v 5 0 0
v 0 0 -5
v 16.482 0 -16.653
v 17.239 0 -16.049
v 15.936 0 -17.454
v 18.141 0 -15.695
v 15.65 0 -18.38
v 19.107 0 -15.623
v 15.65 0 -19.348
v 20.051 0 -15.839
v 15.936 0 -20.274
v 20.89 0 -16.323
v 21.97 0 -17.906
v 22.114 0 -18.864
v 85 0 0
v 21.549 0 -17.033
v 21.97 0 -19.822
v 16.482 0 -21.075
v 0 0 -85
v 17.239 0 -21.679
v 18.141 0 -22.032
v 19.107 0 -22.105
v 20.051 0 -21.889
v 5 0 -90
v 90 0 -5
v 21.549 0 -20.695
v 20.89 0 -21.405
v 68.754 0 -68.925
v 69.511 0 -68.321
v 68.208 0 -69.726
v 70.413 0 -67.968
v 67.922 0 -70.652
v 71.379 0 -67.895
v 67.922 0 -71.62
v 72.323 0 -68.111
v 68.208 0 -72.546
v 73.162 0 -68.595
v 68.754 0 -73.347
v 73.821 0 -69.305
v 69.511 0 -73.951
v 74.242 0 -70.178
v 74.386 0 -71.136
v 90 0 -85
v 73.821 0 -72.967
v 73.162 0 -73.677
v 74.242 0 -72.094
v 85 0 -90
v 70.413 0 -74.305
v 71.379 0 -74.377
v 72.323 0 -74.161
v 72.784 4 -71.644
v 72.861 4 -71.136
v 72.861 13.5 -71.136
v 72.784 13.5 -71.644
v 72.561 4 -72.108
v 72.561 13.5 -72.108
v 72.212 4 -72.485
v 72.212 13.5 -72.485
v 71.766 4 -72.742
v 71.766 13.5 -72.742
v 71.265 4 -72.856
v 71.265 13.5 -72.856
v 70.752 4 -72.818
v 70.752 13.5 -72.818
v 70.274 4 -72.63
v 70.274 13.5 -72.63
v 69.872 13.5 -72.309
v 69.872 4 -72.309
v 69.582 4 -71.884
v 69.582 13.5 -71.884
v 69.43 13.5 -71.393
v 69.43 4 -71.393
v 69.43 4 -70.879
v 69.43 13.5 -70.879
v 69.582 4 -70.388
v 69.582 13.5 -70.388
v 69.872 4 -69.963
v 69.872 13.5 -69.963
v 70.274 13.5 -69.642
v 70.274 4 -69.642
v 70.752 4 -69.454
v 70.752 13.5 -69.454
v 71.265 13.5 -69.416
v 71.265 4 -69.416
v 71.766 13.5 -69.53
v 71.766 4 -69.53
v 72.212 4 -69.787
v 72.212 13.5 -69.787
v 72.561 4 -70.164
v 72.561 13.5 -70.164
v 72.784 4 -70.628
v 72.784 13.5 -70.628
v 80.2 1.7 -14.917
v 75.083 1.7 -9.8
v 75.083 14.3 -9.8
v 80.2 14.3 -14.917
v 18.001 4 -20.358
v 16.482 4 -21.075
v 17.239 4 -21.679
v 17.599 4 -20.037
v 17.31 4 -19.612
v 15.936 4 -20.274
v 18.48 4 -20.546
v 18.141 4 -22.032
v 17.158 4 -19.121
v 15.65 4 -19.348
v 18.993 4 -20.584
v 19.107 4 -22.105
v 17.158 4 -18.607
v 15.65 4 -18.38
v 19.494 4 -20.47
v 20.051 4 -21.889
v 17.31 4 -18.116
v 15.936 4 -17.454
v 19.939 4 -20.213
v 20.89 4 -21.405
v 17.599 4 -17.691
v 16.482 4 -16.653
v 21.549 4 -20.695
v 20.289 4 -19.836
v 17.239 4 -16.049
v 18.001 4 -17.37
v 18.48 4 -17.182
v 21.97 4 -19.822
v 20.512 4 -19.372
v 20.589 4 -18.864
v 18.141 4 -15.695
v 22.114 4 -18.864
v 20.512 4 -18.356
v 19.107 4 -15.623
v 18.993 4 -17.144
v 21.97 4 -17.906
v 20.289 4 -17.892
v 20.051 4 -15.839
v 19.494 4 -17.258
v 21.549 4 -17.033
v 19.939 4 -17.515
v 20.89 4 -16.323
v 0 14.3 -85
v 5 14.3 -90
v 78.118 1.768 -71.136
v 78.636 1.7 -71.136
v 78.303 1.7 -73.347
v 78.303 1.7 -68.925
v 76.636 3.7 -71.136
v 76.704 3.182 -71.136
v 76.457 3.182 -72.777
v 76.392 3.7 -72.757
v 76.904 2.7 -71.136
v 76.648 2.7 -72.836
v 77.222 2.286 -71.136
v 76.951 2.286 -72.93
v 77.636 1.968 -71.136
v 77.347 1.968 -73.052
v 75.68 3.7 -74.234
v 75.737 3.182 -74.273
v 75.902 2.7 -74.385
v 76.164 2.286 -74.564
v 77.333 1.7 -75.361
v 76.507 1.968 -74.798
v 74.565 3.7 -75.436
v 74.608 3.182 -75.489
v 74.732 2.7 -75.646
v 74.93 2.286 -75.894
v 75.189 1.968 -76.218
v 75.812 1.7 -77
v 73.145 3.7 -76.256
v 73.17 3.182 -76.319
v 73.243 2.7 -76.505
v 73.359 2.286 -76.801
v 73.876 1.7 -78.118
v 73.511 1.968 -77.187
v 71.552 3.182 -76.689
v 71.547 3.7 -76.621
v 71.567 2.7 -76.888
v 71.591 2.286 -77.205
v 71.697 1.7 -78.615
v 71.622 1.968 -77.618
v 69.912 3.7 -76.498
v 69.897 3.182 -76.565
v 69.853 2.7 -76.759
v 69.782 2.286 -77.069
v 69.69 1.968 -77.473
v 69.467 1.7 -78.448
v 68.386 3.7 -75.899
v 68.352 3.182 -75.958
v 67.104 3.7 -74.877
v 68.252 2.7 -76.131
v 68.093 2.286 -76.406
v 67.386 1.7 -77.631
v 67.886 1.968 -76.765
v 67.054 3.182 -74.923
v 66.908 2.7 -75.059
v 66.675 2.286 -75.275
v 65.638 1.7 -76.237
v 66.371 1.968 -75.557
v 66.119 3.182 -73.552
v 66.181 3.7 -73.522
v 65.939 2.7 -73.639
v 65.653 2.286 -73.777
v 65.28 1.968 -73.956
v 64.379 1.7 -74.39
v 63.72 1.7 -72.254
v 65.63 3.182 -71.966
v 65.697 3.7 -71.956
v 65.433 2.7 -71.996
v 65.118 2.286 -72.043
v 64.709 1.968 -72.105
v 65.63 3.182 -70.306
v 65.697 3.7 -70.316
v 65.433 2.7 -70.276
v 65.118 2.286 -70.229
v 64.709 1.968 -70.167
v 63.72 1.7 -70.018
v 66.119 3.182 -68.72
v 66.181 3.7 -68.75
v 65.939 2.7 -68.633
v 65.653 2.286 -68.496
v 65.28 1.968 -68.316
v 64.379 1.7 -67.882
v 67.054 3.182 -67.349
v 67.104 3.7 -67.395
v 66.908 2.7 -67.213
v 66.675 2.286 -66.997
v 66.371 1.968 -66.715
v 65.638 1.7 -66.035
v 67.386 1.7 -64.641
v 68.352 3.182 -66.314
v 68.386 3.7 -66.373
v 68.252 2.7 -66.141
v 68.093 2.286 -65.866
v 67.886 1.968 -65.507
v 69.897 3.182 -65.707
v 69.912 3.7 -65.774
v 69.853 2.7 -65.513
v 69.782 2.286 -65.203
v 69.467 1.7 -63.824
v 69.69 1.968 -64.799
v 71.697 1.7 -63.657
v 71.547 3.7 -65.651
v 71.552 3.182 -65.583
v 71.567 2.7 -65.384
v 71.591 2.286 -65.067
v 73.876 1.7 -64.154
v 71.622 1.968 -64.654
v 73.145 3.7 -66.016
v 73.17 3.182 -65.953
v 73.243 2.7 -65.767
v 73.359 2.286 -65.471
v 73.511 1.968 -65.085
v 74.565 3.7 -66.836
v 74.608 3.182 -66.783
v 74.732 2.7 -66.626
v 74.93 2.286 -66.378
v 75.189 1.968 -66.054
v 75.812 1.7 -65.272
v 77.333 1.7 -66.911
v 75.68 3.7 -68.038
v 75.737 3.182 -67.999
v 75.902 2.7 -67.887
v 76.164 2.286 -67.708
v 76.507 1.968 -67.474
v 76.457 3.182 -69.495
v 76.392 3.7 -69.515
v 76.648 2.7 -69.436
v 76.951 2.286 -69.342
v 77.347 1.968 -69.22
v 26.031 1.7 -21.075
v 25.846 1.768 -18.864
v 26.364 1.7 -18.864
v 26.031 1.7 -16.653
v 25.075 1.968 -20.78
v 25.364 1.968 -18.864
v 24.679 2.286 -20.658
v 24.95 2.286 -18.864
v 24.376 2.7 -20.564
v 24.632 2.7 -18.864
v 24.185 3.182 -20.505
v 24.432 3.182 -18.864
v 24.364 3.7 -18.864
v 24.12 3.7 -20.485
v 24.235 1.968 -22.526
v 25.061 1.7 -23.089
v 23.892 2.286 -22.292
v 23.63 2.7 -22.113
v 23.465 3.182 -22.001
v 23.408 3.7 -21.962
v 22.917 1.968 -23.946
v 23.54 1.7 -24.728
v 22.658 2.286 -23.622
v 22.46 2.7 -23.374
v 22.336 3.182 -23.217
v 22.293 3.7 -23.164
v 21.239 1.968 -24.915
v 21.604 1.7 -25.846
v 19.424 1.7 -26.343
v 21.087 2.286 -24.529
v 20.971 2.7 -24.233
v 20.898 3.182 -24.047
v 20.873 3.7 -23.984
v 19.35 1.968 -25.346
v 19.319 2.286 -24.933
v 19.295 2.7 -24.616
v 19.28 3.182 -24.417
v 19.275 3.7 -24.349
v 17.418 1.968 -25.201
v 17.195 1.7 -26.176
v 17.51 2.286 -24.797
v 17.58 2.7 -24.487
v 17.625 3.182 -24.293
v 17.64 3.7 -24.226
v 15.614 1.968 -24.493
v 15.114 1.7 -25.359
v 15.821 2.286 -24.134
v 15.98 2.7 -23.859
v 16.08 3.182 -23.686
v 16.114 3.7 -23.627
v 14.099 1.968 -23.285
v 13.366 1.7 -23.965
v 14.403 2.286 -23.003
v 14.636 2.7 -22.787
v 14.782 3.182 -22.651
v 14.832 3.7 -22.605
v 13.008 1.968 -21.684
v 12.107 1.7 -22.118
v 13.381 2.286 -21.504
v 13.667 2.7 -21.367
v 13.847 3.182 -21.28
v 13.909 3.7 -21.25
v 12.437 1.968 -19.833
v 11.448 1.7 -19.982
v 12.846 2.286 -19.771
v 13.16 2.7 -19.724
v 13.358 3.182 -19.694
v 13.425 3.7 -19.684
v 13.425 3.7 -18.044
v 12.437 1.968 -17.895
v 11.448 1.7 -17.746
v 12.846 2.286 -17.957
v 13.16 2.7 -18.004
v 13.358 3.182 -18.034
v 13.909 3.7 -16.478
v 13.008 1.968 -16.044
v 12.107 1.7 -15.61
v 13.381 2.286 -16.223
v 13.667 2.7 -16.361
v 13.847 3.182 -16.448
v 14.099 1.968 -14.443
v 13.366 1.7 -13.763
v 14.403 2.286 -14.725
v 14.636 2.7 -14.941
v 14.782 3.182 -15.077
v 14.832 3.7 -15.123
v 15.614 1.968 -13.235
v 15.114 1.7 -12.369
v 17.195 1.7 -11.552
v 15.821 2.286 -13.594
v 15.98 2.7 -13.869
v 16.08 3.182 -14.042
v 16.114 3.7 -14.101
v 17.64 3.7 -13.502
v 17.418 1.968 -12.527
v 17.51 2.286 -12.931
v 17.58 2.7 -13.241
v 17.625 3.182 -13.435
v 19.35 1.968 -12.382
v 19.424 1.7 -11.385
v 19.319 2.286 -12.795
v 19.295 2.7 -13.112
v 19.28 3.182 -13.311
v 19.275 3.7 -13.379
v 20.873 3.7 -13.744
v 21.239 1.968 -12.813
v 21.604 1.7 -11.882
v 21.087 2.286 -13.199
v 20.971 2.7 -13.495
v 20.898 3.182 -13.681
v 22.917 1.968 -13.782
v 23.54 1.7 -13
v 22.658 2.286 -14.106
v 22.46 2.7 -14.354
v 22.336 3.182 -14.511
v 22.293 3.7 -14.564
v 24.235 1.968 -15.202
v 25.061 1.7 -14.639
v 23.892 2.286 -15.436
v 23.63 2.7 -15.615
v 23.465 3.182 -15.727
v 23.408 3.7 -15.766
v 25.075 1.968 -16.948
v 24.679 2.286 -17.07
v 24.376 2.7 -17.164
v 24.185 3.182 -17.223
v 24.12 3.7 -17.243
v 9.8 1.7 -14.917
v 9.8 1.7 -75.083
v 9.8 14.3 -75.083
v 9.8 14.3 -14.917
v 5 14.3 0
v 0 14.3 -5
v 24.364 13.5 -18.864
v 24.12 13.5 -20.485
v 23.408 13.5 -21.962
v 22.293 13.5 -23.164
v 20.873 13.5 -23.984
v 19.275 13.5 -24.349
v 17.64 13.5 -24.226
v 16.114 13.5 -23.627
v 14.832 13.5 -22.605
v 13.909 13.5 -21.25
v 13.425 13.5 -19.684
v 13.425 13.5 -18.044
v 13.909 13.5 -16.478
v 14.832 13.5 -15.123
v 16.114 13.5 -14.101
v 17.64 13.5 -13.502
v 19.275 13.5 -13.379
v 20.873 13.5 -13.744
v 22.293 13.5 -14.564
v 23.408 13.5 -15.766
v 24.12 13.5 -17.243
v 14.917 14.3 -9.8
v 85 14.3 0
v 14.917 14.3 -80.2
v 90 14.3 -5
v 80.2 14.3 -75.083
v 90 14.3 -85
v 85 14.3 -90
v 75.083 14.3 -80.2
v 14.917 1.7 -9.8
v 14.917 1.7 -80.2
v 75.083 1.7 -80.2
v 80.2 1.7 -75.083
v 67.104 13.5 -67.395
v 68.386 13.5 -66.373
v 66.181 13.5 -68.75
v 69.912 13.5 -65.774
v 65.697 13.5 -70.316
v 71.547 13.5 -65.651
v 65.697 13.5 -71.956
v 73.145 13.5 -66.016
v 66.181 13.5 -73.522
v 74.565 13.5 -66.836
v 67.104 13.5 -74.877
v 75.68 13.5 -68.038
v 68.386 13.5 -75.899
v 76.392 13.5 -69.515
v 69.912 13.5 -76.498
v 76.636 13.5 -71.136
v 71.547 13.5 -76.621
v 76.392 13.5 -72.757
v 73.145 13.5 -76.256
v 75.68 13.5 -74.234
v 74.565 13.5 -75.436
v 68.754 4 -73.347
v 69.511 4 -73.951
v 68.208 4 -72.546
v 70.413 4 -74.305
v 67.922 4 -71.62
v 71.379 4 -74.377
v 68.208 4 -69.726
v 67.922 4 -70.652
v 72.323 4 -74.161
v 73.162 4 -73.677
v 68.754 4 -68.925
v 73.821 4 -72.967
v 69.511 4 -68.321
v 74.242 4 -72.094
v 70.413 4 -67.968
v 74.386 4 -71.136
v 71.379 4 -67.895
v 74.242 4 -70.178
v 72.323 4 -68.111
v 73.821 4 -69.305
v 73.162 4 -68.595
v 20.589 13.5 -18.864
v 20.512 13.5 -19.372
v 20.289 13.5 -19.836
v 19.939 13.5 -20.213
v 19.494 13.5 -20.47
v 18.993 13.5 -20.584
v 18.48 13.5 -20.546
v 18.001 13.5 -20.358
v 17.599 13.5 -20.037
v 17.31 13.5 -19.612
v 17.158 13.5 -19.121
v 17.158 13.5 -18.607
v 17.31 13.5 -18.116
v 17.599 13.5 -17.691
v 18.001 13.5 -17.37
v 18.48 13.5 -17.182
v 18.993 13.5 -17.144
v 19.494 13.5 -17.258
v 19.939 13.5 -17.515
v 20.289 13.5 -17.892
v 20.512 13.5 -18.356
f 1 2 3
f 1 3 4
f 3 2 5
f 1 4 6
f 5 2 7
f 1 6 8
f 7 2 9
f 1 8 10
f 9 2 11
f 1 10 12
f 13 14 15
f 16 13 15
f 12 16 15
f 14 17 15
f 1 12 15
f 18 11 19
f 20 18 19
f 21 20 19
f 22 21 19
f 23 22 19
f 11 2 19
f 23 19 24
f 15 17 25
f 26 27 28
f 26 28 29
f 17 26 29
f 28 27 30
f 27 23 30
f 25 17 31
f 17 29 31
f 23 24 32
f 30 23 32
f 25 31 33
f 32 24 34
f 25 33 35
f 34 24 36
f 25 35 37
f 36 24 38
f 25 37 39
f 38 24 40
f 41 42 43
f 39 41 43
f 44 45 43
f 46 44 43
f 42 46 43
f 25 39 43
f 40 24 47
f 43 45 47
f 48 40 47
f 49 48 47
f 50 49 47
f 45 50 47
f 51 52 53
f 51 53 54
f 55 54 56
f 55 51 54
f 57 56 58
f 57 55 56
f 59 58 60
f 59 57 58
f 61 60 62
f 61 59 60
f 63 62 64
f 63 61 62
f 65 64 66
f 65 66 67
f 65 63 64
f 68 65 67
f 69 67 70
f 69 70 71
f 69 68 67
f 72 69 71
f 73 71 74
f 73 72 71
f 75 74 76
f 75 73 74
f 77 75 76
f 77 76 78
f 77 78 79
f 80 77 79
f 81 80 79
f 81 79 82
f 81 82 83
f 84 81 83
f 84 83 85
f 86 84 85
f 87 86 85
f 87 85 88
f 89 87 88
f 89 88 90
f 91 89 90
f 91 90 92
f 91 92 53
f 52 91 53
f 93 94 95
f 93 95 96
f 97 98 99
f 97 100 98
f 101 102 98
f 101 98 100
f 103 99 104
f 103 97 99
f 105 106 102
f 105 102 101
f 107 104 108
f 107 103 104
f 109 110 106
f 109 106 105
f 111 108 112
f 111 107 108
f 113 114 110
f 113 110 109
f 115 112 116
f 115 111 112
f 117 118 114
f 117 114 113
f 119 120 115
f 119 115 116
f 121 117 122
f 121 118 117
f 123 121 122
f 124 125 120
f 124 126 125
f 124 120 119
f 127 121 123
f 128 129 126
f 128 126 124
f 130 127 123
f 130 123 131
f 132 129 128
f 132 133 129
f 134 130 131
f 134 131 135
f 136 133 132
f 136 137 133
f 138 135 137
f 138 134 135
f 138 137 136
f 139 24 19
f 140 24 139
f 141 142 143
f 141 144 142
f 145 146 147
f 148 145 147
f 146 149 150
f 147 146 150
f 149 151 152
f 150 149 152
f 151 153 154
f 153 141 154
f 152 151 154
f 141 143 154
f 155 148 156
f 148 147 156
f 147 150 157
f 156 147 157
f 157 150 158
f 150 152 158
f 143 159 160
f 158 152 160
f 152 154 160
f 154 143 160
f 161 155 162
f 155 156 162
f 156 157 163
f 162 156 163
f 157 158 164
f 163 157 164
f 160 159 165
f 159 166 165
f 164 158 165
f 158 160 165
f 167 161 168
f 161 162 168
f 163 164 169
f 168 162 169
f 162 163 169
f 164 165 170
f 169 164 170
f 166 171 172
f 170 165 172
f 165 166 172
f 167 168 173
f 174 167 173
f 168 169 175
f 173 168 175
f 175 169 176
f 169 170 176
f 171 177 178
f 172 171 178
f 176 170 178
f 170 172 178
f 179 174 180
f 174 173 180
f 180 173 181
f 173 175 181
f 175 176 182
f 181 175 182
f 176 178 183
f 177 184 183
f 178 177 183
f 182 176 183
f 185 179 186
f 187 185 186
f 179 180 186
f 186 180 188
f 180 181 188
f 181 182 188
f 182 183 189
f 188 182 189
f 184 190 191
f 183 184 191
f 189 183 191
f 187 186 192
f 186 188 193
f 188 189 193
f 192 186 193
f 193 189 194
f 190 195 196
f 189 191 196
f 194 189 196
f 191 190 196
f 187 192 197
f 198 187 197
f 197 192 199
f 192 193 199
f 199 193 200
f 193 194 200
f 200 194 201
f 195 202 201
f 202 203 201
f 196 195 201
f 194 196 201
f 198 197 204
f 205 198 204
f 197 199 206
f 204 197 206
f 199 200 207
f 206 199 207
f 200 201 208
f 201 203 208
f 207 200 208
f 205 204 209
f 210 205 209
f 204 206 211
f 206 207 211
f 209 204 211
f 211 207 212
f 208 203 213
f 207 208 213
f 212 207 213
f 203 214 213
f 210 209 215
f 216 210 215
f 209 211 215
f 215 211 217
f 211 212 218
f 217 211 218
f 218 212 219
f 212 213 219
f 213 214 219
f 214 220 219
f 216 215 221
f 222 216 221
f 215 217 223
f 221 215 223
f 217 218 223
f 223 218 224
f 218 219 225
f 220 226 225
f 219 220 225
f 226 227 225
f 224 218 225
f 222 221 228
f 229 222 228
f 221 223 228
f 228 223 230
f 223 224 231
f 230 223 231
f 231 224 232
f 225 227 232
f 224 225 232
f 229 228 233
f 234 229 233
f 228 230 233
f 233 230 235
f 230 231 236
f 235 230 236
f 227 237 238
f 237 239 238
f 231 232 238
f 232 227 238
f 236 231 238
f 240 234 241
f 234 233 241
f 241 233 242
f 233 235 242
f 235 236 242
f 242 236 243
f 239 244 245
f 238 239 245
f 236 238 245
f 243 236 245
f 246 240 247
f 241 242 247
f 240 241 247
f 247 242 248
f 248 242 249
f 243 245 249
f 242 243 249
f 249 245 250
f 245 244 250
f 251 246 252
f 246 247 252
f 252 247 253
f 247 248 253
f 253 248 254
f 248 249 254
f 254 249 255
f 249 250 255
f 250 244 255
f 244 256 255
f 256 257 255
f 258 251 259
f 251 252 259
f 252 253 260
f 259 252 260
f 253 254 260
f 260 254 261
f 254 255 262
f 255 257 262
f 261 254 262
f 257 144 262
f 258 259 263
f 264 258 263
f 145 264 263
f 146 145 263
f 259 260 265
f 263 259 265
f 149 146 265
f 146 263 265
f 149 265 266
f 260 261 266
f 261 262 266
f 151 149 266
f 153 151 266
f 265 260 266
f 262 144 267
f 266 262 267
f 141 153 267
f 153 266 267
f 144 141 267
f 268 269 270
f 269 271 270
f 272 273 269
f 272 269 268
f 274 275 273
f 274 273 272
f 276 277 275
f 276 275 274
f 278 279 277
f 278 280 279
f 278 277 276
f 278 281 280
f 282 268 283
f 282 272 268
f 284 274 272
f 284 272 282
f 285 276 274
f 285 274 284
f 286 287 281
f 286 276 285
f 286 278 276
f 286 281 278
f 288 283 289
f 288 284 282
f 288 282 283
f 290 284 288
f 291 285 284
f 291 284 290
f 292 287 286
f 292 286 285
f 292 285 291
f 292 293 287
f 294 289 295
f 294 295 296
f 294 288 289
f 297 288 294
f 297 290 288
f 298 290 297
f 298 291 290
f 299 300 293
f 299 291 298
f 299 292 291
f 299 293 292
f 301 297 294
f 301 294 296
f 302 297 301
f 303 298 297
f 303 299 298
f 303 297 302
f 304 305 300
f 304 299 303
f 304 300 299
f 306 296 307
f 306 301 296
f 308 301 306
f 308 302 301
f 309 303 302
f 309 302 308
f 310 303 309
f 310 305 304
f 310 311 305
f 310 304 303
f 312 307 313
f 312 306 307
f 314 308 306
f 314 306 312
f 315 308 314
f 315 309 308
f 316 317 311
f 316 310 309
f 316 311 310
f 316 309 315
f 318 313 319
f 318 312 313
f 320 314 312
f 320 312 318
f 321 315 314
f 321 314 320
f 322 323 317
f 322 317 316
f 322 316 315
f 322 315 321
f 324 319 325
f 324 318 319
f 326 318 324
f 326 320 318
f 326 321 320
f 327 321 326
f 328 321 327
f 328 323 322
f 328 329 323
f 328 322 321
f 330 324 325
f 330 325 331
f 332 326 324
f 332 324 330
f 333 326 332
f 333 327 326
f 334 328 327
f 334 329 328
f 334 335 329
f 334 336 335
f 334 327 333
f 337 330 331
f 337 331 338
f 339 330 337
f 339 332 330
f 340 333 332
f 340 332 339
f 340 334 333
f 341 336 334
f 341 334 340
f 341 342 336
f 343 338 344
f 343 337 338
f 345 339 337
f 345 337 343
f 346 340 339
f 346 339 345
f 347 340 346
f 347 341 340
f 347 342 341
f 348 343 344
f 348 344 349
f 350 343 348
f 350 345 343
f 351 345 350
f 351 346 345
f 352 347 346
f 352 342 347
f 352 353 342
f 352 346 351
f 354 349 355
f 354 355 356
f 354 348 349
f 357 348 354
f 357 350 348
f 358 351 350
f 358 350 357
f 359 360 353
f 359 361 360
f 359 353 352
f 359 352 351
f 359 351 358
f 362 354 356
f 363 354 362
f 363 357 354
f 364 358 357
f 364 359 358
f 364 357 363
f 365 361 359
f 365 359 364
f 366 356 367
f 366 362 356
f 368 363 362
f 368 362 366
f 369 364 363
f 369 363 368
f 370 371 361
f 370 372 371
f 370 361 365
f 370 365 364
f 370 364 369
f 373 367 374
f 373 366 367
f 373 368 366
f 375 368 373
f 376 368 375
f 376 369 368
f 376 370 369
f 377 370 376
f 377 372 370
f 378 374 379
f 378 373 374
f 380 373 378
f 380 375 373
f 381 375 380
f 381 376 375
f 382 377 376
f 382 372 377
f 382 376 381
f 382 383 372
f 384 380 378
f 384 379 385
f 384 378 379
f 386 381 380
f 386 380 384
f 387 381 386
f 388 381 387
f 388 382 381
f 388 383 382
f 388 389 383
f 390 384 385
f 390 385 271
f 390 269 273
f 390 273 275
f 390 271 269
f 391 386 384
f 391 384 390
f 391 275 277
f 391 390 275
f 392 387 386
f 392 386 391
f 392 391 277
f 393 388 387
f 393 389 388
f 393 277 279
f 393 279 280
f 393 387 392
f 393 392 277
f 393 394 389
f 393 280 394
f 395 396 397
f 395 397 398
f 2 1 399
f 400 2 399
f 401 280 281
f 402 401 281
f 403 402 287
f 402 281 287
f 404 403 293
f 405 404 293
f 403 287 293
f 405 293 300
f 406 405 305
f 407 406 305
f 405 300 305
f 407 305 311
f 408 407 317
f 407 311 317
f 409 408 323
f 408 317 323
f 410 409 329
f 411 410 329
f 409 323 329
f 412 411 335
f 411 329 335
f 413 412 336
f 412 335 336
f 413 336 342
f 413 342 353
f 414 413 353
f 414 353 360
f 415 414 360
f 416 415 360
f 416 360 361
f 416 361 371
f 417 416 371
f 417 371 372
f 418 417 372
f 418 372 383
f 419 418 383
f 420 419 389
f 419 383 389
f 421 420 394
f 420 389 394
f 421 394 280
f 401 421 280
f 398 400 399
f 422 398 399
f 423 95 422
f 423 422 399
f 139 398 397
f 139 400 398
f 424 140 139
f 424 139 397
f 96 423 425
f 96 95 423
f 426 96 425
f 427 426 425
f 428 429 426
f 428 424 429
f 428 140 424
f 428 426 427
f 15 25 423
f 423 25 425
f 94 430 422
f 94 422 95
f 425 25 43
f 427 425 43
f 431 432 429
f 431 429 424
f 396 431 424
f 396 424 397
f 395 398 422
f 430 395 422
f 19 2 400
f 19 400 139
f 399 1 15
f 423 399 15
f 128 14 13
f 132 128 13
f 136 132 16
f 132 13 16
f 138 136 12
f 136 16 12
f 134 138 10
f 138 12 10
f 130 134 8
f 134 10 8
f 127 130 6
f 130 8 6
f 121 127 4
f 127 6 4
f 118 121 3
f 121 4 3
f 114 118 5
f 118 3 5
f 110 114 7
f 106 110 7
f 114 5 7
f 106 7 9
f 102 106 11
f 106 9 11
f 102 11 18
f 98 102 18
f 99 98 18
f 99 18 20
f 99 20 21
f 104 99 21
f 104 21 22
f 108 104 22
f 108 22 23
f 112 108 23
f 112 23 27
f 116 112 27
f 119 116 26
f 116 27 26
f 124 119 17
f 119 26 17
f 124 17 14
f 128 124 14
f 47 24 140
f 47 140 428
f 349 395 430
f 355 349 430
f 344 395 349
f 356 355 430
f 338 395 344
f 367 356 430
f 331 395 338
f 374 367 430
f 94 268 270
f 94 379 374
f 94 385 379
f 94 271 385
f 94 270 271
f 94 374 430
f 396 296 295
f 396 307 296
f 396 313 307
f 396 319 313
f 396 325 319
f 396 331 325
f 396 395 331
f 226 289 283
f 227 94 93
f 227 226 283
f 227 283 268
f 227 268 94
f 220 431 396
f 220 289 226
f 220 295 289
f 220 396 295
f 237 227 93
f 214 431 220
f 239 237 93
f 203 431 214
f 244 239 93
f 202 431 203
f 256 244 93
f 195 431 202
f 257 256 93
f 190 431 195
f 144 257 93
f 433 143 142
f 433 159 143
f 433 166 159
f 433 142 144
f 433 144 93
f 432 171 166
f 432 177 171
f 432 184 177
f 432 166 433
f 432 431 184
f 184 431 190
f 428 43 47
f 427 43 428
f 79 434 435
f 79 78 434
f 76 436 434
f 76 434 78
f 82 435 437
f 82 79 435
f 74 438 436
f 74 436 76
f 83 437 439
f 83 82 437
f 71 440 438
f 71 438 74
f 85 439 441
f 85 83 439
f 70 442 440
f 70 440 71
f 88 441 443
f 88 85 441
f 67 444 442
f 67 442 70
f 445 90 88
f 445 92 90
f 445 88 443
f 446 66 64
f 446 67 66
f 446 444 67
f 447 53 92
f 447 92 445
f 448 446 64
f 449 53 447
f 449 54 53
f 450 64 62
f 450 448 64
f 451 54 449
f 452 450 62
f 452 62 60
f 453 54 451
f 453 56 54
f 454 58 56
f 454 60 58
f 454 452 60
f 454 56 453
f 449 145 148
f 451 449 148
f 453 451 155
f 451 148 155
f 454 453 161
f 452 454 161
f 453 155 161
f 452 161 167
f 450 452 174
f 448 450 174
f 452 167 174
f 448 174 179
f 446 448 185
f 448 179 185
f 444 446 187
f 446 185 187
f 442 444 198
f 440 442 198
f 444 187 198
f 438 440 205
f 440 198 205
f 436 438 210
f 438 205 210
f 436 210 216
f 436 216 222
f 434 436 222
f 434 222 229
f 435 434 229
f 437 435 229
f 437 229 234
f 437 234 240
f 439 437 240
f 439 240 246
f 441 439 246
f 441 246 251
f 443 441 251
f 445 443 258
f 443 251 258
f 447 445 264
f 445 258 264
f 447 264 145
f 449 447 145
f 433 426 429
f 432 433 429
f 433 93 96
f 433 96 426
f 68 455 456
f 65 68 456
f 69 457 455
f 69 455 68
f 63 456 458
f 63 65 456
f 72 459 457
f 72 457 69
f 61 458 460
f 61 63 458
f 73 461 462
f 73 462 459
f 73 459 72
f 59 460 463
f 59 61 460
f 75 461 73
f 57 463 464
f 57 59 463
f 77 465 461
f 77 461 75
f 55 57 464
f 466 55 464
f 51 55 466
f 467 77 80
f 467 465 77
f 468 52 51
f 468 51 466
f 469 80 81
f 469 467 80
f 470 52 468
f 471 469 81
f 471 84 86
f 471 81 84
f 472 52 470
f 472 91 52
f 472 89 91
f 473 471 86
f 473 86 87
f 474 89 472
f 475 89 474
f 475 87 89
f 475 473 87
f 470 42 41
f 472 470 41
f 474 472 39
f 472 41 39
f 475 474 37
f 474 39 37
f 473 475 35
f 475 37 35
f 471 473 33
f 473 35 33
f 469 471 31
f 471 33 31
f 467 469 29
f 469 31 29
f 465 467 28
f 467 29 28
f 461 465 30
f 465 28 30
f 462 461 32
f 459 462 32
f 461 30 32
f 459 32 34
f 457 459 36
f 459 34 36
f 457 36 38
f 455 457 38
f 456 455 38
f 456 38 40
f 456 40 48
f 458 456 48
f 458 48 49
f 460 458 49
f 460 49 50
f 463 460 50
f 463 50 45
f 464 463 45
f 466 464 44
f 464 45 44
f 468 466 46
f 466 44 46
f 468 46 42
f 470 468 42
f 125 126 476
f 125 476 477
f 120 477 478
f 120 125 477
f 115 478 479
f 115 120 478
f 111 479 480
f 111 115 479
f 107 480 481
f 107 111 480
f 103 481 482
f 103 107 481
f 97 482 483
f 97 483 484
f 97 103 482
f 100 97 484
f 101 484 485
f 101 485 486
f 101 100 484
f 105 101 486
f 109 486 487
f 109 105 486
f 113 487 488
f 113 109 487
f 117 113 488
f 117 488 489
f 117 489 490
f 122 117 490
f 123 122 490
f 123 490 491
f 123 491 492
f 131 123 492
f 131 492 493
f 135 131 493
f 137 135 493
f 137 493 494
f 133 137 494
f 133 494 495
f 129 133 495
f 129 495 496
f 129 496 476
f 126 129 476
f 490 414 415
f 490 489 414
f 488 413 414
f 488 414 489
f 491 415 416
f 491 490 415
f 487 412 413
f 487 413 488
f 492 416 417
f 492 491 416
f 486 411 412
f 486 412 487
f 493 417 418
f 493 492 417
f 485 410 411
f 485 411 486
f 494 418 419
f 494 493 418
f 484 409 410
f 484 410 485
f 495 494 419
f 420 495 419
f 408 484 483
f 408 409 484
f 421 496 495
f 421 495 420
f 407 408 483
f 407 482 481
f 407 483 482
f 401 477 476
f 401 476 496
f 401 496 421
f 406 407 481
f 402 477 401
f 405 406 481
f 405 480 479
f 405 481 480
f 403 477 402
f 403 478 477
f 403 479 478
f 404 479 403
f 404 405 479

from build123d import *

# Parameters (mm, degrees)
SKETCH1_W           = 90
SKETCH1_H           = 90
BOSS_EXTRUDE1_DEPTH = 14.3
SKETCH2_W           = 70
SKETCH2_H           = 70
CUT_EXTRUDE1_DEPTH  = 12.6
SKETCH3_R           = 1.725
CUT_EXTRUDE2_DEPTH  = 2.7
CHAMFER1_SIZE       = 5
SKETCH4_R           = 5.5
SKETCH4_R_2         = 1.725
BOSS_EXTRUDE2_DEPTH = 11.8
FILLET1_R           = 2
SKETCH5_R           = 3.25
CUT_EXTRUDE3_DEPTH  = 4
CHAMFER2_SIZE       = 5
CUT_EXTRUDE4_DEPTH  = 13.6


with BuildPart() as part:
    # Sketch1 → Boss-Extrude1 (new body)
    with BuildSketch(Plane(origin=(0, 0, 0), x_dir=(1, 0, 0), z_dir=(0, 1, 0))):
        with Locations((45, 45)):
            Rectangle(SKETCH1_W, SKETCH1_H)
    extrude(amount=BOSS_EXTRUDE1_DEPTH)

    # Sketch2 → Cut-Extrude1 (cut)
    with BuildSketch(Plane(origin=(0, 14.3, 0), x_dir=(1, 0, 0), z_dir=(0, 1, 0))):
        with Locations((45, 45)):
            Rectangle(SKETCH2_W, SKETCH2_H)
    extrude(amount=-CUT_EXTRUDE1_DEPTH, mode=Mode.SUBTRACT)

    # Sketch3 → Cut-Extrude2 (cut, through all)
    with BuildSketch(Plane(origin=(0, 1.7, 0), x_dir=(1, 0, 0), z_dir=(0, 1, 0))):
        with Locations((18.863961034, 18.863961034)):
            Circle(SKETCH3_R)
        with Locations((71.136038966, 71.136038966)):
            Circle(SKETCH3_R)
    extrude(amount=-CUT_EXTRUDE2_DEPTH, mode=Mode.SUBTRACT)

    # Chamfer1
    chamfer1_edges = [part.edges().sort_by_distance(p)[0] for p in [
        (0, 7.15, -90),
        (90, 7.15, -90),
        (90, 7.15, 0),
        (0, 7.15, 0),
    ]]
    chamfer(chamfer1_edges, length=CHAMFER1_SIZE)

    # Sketch4 → Boss-Extrude2 (add)
    with BuildSketch(Plane(origin=(0, 1.7, 0), x_dir=(1, 0, 0), z_dir=(0, 1, 0))):
        with Locations((71.136038966, 71.136038966)):
            Circle(SKETCH4_R)
        with Locations((71.136038966, 71.136038966)):
            Circle(SKETCH4_R_2, mode=Mode.SUBTRACT)
        with Locations((18.863961034, 18.863961034)):
            Circle(SKETCH4_R)
        with Locations((18.863961034, 18.863961034)):
            Circle(SKETCH4_R_2, mode=Mode.SUBTRACT)
    extrude(amount=BOSS_EXTRUDE2_DEPTH)

    # Fillet1
    fillet1_edges = [part.edges().sort_by_distance(p)[0] for p in [
        (65.636038966, 1.7, -71.136038966),
        (13.363961034, 1.7, -18.863961034),
    ]]
    fillet(fillet1_edges, radius=FILLET1_R)

    # Sketch5 → Cut-Extrude3 (cut)
    with BuildSketch(Plane.XZ):
        with Locations((18.863961034, -18.863961034)):
            Circle(SKETCH5_R)
        with Locations((71.136038966, -71.136038966)):
            Circle(SKETCH5_R)
    extrude(amount=-CUT_EXTRUDE3_DEPTH, mode=Mode.SUBTRACT)

    # Chamfer2
    chamfer2_edges = [part.edges().sort_by_distance(p)[0] for p in [
        (10, 8, -10),
        (10, 8, -80),
        (80, 8, -80),
        (80, 8, -10),
    ]]
    chamfer(chamfer2_edges, length=CHAMFER2_SIZE)

    # Sketch6 → Cut-Extrude4 (cut, through all)
    with BuildSketch(Plane(origin=(0, 1.7, 0), x_dir=(1, 0, 0), z_dir=(0, 1, 0))):
        Polygon((80.2, 14.917157288), (80.2, 75.082842712), (75.082842712, 80.2), (14.917157288, 80.2), (9.8, 75.082842712), (9.8, 14.917157288), (14.917157288, 9.8), (75.082842712, 9.8), align=None)
        Polygon((15, 10), (10, 15), (10, 75), (15, 80), (75, 80), (80, 75), (80, 15), (75, 10), align=None, mode=Mode.SUBTRACT)
    extrude(amount=CUT_EXTRUDE4_DEPTH, mode=Mode.SUBTRACT)


solid = part.part
